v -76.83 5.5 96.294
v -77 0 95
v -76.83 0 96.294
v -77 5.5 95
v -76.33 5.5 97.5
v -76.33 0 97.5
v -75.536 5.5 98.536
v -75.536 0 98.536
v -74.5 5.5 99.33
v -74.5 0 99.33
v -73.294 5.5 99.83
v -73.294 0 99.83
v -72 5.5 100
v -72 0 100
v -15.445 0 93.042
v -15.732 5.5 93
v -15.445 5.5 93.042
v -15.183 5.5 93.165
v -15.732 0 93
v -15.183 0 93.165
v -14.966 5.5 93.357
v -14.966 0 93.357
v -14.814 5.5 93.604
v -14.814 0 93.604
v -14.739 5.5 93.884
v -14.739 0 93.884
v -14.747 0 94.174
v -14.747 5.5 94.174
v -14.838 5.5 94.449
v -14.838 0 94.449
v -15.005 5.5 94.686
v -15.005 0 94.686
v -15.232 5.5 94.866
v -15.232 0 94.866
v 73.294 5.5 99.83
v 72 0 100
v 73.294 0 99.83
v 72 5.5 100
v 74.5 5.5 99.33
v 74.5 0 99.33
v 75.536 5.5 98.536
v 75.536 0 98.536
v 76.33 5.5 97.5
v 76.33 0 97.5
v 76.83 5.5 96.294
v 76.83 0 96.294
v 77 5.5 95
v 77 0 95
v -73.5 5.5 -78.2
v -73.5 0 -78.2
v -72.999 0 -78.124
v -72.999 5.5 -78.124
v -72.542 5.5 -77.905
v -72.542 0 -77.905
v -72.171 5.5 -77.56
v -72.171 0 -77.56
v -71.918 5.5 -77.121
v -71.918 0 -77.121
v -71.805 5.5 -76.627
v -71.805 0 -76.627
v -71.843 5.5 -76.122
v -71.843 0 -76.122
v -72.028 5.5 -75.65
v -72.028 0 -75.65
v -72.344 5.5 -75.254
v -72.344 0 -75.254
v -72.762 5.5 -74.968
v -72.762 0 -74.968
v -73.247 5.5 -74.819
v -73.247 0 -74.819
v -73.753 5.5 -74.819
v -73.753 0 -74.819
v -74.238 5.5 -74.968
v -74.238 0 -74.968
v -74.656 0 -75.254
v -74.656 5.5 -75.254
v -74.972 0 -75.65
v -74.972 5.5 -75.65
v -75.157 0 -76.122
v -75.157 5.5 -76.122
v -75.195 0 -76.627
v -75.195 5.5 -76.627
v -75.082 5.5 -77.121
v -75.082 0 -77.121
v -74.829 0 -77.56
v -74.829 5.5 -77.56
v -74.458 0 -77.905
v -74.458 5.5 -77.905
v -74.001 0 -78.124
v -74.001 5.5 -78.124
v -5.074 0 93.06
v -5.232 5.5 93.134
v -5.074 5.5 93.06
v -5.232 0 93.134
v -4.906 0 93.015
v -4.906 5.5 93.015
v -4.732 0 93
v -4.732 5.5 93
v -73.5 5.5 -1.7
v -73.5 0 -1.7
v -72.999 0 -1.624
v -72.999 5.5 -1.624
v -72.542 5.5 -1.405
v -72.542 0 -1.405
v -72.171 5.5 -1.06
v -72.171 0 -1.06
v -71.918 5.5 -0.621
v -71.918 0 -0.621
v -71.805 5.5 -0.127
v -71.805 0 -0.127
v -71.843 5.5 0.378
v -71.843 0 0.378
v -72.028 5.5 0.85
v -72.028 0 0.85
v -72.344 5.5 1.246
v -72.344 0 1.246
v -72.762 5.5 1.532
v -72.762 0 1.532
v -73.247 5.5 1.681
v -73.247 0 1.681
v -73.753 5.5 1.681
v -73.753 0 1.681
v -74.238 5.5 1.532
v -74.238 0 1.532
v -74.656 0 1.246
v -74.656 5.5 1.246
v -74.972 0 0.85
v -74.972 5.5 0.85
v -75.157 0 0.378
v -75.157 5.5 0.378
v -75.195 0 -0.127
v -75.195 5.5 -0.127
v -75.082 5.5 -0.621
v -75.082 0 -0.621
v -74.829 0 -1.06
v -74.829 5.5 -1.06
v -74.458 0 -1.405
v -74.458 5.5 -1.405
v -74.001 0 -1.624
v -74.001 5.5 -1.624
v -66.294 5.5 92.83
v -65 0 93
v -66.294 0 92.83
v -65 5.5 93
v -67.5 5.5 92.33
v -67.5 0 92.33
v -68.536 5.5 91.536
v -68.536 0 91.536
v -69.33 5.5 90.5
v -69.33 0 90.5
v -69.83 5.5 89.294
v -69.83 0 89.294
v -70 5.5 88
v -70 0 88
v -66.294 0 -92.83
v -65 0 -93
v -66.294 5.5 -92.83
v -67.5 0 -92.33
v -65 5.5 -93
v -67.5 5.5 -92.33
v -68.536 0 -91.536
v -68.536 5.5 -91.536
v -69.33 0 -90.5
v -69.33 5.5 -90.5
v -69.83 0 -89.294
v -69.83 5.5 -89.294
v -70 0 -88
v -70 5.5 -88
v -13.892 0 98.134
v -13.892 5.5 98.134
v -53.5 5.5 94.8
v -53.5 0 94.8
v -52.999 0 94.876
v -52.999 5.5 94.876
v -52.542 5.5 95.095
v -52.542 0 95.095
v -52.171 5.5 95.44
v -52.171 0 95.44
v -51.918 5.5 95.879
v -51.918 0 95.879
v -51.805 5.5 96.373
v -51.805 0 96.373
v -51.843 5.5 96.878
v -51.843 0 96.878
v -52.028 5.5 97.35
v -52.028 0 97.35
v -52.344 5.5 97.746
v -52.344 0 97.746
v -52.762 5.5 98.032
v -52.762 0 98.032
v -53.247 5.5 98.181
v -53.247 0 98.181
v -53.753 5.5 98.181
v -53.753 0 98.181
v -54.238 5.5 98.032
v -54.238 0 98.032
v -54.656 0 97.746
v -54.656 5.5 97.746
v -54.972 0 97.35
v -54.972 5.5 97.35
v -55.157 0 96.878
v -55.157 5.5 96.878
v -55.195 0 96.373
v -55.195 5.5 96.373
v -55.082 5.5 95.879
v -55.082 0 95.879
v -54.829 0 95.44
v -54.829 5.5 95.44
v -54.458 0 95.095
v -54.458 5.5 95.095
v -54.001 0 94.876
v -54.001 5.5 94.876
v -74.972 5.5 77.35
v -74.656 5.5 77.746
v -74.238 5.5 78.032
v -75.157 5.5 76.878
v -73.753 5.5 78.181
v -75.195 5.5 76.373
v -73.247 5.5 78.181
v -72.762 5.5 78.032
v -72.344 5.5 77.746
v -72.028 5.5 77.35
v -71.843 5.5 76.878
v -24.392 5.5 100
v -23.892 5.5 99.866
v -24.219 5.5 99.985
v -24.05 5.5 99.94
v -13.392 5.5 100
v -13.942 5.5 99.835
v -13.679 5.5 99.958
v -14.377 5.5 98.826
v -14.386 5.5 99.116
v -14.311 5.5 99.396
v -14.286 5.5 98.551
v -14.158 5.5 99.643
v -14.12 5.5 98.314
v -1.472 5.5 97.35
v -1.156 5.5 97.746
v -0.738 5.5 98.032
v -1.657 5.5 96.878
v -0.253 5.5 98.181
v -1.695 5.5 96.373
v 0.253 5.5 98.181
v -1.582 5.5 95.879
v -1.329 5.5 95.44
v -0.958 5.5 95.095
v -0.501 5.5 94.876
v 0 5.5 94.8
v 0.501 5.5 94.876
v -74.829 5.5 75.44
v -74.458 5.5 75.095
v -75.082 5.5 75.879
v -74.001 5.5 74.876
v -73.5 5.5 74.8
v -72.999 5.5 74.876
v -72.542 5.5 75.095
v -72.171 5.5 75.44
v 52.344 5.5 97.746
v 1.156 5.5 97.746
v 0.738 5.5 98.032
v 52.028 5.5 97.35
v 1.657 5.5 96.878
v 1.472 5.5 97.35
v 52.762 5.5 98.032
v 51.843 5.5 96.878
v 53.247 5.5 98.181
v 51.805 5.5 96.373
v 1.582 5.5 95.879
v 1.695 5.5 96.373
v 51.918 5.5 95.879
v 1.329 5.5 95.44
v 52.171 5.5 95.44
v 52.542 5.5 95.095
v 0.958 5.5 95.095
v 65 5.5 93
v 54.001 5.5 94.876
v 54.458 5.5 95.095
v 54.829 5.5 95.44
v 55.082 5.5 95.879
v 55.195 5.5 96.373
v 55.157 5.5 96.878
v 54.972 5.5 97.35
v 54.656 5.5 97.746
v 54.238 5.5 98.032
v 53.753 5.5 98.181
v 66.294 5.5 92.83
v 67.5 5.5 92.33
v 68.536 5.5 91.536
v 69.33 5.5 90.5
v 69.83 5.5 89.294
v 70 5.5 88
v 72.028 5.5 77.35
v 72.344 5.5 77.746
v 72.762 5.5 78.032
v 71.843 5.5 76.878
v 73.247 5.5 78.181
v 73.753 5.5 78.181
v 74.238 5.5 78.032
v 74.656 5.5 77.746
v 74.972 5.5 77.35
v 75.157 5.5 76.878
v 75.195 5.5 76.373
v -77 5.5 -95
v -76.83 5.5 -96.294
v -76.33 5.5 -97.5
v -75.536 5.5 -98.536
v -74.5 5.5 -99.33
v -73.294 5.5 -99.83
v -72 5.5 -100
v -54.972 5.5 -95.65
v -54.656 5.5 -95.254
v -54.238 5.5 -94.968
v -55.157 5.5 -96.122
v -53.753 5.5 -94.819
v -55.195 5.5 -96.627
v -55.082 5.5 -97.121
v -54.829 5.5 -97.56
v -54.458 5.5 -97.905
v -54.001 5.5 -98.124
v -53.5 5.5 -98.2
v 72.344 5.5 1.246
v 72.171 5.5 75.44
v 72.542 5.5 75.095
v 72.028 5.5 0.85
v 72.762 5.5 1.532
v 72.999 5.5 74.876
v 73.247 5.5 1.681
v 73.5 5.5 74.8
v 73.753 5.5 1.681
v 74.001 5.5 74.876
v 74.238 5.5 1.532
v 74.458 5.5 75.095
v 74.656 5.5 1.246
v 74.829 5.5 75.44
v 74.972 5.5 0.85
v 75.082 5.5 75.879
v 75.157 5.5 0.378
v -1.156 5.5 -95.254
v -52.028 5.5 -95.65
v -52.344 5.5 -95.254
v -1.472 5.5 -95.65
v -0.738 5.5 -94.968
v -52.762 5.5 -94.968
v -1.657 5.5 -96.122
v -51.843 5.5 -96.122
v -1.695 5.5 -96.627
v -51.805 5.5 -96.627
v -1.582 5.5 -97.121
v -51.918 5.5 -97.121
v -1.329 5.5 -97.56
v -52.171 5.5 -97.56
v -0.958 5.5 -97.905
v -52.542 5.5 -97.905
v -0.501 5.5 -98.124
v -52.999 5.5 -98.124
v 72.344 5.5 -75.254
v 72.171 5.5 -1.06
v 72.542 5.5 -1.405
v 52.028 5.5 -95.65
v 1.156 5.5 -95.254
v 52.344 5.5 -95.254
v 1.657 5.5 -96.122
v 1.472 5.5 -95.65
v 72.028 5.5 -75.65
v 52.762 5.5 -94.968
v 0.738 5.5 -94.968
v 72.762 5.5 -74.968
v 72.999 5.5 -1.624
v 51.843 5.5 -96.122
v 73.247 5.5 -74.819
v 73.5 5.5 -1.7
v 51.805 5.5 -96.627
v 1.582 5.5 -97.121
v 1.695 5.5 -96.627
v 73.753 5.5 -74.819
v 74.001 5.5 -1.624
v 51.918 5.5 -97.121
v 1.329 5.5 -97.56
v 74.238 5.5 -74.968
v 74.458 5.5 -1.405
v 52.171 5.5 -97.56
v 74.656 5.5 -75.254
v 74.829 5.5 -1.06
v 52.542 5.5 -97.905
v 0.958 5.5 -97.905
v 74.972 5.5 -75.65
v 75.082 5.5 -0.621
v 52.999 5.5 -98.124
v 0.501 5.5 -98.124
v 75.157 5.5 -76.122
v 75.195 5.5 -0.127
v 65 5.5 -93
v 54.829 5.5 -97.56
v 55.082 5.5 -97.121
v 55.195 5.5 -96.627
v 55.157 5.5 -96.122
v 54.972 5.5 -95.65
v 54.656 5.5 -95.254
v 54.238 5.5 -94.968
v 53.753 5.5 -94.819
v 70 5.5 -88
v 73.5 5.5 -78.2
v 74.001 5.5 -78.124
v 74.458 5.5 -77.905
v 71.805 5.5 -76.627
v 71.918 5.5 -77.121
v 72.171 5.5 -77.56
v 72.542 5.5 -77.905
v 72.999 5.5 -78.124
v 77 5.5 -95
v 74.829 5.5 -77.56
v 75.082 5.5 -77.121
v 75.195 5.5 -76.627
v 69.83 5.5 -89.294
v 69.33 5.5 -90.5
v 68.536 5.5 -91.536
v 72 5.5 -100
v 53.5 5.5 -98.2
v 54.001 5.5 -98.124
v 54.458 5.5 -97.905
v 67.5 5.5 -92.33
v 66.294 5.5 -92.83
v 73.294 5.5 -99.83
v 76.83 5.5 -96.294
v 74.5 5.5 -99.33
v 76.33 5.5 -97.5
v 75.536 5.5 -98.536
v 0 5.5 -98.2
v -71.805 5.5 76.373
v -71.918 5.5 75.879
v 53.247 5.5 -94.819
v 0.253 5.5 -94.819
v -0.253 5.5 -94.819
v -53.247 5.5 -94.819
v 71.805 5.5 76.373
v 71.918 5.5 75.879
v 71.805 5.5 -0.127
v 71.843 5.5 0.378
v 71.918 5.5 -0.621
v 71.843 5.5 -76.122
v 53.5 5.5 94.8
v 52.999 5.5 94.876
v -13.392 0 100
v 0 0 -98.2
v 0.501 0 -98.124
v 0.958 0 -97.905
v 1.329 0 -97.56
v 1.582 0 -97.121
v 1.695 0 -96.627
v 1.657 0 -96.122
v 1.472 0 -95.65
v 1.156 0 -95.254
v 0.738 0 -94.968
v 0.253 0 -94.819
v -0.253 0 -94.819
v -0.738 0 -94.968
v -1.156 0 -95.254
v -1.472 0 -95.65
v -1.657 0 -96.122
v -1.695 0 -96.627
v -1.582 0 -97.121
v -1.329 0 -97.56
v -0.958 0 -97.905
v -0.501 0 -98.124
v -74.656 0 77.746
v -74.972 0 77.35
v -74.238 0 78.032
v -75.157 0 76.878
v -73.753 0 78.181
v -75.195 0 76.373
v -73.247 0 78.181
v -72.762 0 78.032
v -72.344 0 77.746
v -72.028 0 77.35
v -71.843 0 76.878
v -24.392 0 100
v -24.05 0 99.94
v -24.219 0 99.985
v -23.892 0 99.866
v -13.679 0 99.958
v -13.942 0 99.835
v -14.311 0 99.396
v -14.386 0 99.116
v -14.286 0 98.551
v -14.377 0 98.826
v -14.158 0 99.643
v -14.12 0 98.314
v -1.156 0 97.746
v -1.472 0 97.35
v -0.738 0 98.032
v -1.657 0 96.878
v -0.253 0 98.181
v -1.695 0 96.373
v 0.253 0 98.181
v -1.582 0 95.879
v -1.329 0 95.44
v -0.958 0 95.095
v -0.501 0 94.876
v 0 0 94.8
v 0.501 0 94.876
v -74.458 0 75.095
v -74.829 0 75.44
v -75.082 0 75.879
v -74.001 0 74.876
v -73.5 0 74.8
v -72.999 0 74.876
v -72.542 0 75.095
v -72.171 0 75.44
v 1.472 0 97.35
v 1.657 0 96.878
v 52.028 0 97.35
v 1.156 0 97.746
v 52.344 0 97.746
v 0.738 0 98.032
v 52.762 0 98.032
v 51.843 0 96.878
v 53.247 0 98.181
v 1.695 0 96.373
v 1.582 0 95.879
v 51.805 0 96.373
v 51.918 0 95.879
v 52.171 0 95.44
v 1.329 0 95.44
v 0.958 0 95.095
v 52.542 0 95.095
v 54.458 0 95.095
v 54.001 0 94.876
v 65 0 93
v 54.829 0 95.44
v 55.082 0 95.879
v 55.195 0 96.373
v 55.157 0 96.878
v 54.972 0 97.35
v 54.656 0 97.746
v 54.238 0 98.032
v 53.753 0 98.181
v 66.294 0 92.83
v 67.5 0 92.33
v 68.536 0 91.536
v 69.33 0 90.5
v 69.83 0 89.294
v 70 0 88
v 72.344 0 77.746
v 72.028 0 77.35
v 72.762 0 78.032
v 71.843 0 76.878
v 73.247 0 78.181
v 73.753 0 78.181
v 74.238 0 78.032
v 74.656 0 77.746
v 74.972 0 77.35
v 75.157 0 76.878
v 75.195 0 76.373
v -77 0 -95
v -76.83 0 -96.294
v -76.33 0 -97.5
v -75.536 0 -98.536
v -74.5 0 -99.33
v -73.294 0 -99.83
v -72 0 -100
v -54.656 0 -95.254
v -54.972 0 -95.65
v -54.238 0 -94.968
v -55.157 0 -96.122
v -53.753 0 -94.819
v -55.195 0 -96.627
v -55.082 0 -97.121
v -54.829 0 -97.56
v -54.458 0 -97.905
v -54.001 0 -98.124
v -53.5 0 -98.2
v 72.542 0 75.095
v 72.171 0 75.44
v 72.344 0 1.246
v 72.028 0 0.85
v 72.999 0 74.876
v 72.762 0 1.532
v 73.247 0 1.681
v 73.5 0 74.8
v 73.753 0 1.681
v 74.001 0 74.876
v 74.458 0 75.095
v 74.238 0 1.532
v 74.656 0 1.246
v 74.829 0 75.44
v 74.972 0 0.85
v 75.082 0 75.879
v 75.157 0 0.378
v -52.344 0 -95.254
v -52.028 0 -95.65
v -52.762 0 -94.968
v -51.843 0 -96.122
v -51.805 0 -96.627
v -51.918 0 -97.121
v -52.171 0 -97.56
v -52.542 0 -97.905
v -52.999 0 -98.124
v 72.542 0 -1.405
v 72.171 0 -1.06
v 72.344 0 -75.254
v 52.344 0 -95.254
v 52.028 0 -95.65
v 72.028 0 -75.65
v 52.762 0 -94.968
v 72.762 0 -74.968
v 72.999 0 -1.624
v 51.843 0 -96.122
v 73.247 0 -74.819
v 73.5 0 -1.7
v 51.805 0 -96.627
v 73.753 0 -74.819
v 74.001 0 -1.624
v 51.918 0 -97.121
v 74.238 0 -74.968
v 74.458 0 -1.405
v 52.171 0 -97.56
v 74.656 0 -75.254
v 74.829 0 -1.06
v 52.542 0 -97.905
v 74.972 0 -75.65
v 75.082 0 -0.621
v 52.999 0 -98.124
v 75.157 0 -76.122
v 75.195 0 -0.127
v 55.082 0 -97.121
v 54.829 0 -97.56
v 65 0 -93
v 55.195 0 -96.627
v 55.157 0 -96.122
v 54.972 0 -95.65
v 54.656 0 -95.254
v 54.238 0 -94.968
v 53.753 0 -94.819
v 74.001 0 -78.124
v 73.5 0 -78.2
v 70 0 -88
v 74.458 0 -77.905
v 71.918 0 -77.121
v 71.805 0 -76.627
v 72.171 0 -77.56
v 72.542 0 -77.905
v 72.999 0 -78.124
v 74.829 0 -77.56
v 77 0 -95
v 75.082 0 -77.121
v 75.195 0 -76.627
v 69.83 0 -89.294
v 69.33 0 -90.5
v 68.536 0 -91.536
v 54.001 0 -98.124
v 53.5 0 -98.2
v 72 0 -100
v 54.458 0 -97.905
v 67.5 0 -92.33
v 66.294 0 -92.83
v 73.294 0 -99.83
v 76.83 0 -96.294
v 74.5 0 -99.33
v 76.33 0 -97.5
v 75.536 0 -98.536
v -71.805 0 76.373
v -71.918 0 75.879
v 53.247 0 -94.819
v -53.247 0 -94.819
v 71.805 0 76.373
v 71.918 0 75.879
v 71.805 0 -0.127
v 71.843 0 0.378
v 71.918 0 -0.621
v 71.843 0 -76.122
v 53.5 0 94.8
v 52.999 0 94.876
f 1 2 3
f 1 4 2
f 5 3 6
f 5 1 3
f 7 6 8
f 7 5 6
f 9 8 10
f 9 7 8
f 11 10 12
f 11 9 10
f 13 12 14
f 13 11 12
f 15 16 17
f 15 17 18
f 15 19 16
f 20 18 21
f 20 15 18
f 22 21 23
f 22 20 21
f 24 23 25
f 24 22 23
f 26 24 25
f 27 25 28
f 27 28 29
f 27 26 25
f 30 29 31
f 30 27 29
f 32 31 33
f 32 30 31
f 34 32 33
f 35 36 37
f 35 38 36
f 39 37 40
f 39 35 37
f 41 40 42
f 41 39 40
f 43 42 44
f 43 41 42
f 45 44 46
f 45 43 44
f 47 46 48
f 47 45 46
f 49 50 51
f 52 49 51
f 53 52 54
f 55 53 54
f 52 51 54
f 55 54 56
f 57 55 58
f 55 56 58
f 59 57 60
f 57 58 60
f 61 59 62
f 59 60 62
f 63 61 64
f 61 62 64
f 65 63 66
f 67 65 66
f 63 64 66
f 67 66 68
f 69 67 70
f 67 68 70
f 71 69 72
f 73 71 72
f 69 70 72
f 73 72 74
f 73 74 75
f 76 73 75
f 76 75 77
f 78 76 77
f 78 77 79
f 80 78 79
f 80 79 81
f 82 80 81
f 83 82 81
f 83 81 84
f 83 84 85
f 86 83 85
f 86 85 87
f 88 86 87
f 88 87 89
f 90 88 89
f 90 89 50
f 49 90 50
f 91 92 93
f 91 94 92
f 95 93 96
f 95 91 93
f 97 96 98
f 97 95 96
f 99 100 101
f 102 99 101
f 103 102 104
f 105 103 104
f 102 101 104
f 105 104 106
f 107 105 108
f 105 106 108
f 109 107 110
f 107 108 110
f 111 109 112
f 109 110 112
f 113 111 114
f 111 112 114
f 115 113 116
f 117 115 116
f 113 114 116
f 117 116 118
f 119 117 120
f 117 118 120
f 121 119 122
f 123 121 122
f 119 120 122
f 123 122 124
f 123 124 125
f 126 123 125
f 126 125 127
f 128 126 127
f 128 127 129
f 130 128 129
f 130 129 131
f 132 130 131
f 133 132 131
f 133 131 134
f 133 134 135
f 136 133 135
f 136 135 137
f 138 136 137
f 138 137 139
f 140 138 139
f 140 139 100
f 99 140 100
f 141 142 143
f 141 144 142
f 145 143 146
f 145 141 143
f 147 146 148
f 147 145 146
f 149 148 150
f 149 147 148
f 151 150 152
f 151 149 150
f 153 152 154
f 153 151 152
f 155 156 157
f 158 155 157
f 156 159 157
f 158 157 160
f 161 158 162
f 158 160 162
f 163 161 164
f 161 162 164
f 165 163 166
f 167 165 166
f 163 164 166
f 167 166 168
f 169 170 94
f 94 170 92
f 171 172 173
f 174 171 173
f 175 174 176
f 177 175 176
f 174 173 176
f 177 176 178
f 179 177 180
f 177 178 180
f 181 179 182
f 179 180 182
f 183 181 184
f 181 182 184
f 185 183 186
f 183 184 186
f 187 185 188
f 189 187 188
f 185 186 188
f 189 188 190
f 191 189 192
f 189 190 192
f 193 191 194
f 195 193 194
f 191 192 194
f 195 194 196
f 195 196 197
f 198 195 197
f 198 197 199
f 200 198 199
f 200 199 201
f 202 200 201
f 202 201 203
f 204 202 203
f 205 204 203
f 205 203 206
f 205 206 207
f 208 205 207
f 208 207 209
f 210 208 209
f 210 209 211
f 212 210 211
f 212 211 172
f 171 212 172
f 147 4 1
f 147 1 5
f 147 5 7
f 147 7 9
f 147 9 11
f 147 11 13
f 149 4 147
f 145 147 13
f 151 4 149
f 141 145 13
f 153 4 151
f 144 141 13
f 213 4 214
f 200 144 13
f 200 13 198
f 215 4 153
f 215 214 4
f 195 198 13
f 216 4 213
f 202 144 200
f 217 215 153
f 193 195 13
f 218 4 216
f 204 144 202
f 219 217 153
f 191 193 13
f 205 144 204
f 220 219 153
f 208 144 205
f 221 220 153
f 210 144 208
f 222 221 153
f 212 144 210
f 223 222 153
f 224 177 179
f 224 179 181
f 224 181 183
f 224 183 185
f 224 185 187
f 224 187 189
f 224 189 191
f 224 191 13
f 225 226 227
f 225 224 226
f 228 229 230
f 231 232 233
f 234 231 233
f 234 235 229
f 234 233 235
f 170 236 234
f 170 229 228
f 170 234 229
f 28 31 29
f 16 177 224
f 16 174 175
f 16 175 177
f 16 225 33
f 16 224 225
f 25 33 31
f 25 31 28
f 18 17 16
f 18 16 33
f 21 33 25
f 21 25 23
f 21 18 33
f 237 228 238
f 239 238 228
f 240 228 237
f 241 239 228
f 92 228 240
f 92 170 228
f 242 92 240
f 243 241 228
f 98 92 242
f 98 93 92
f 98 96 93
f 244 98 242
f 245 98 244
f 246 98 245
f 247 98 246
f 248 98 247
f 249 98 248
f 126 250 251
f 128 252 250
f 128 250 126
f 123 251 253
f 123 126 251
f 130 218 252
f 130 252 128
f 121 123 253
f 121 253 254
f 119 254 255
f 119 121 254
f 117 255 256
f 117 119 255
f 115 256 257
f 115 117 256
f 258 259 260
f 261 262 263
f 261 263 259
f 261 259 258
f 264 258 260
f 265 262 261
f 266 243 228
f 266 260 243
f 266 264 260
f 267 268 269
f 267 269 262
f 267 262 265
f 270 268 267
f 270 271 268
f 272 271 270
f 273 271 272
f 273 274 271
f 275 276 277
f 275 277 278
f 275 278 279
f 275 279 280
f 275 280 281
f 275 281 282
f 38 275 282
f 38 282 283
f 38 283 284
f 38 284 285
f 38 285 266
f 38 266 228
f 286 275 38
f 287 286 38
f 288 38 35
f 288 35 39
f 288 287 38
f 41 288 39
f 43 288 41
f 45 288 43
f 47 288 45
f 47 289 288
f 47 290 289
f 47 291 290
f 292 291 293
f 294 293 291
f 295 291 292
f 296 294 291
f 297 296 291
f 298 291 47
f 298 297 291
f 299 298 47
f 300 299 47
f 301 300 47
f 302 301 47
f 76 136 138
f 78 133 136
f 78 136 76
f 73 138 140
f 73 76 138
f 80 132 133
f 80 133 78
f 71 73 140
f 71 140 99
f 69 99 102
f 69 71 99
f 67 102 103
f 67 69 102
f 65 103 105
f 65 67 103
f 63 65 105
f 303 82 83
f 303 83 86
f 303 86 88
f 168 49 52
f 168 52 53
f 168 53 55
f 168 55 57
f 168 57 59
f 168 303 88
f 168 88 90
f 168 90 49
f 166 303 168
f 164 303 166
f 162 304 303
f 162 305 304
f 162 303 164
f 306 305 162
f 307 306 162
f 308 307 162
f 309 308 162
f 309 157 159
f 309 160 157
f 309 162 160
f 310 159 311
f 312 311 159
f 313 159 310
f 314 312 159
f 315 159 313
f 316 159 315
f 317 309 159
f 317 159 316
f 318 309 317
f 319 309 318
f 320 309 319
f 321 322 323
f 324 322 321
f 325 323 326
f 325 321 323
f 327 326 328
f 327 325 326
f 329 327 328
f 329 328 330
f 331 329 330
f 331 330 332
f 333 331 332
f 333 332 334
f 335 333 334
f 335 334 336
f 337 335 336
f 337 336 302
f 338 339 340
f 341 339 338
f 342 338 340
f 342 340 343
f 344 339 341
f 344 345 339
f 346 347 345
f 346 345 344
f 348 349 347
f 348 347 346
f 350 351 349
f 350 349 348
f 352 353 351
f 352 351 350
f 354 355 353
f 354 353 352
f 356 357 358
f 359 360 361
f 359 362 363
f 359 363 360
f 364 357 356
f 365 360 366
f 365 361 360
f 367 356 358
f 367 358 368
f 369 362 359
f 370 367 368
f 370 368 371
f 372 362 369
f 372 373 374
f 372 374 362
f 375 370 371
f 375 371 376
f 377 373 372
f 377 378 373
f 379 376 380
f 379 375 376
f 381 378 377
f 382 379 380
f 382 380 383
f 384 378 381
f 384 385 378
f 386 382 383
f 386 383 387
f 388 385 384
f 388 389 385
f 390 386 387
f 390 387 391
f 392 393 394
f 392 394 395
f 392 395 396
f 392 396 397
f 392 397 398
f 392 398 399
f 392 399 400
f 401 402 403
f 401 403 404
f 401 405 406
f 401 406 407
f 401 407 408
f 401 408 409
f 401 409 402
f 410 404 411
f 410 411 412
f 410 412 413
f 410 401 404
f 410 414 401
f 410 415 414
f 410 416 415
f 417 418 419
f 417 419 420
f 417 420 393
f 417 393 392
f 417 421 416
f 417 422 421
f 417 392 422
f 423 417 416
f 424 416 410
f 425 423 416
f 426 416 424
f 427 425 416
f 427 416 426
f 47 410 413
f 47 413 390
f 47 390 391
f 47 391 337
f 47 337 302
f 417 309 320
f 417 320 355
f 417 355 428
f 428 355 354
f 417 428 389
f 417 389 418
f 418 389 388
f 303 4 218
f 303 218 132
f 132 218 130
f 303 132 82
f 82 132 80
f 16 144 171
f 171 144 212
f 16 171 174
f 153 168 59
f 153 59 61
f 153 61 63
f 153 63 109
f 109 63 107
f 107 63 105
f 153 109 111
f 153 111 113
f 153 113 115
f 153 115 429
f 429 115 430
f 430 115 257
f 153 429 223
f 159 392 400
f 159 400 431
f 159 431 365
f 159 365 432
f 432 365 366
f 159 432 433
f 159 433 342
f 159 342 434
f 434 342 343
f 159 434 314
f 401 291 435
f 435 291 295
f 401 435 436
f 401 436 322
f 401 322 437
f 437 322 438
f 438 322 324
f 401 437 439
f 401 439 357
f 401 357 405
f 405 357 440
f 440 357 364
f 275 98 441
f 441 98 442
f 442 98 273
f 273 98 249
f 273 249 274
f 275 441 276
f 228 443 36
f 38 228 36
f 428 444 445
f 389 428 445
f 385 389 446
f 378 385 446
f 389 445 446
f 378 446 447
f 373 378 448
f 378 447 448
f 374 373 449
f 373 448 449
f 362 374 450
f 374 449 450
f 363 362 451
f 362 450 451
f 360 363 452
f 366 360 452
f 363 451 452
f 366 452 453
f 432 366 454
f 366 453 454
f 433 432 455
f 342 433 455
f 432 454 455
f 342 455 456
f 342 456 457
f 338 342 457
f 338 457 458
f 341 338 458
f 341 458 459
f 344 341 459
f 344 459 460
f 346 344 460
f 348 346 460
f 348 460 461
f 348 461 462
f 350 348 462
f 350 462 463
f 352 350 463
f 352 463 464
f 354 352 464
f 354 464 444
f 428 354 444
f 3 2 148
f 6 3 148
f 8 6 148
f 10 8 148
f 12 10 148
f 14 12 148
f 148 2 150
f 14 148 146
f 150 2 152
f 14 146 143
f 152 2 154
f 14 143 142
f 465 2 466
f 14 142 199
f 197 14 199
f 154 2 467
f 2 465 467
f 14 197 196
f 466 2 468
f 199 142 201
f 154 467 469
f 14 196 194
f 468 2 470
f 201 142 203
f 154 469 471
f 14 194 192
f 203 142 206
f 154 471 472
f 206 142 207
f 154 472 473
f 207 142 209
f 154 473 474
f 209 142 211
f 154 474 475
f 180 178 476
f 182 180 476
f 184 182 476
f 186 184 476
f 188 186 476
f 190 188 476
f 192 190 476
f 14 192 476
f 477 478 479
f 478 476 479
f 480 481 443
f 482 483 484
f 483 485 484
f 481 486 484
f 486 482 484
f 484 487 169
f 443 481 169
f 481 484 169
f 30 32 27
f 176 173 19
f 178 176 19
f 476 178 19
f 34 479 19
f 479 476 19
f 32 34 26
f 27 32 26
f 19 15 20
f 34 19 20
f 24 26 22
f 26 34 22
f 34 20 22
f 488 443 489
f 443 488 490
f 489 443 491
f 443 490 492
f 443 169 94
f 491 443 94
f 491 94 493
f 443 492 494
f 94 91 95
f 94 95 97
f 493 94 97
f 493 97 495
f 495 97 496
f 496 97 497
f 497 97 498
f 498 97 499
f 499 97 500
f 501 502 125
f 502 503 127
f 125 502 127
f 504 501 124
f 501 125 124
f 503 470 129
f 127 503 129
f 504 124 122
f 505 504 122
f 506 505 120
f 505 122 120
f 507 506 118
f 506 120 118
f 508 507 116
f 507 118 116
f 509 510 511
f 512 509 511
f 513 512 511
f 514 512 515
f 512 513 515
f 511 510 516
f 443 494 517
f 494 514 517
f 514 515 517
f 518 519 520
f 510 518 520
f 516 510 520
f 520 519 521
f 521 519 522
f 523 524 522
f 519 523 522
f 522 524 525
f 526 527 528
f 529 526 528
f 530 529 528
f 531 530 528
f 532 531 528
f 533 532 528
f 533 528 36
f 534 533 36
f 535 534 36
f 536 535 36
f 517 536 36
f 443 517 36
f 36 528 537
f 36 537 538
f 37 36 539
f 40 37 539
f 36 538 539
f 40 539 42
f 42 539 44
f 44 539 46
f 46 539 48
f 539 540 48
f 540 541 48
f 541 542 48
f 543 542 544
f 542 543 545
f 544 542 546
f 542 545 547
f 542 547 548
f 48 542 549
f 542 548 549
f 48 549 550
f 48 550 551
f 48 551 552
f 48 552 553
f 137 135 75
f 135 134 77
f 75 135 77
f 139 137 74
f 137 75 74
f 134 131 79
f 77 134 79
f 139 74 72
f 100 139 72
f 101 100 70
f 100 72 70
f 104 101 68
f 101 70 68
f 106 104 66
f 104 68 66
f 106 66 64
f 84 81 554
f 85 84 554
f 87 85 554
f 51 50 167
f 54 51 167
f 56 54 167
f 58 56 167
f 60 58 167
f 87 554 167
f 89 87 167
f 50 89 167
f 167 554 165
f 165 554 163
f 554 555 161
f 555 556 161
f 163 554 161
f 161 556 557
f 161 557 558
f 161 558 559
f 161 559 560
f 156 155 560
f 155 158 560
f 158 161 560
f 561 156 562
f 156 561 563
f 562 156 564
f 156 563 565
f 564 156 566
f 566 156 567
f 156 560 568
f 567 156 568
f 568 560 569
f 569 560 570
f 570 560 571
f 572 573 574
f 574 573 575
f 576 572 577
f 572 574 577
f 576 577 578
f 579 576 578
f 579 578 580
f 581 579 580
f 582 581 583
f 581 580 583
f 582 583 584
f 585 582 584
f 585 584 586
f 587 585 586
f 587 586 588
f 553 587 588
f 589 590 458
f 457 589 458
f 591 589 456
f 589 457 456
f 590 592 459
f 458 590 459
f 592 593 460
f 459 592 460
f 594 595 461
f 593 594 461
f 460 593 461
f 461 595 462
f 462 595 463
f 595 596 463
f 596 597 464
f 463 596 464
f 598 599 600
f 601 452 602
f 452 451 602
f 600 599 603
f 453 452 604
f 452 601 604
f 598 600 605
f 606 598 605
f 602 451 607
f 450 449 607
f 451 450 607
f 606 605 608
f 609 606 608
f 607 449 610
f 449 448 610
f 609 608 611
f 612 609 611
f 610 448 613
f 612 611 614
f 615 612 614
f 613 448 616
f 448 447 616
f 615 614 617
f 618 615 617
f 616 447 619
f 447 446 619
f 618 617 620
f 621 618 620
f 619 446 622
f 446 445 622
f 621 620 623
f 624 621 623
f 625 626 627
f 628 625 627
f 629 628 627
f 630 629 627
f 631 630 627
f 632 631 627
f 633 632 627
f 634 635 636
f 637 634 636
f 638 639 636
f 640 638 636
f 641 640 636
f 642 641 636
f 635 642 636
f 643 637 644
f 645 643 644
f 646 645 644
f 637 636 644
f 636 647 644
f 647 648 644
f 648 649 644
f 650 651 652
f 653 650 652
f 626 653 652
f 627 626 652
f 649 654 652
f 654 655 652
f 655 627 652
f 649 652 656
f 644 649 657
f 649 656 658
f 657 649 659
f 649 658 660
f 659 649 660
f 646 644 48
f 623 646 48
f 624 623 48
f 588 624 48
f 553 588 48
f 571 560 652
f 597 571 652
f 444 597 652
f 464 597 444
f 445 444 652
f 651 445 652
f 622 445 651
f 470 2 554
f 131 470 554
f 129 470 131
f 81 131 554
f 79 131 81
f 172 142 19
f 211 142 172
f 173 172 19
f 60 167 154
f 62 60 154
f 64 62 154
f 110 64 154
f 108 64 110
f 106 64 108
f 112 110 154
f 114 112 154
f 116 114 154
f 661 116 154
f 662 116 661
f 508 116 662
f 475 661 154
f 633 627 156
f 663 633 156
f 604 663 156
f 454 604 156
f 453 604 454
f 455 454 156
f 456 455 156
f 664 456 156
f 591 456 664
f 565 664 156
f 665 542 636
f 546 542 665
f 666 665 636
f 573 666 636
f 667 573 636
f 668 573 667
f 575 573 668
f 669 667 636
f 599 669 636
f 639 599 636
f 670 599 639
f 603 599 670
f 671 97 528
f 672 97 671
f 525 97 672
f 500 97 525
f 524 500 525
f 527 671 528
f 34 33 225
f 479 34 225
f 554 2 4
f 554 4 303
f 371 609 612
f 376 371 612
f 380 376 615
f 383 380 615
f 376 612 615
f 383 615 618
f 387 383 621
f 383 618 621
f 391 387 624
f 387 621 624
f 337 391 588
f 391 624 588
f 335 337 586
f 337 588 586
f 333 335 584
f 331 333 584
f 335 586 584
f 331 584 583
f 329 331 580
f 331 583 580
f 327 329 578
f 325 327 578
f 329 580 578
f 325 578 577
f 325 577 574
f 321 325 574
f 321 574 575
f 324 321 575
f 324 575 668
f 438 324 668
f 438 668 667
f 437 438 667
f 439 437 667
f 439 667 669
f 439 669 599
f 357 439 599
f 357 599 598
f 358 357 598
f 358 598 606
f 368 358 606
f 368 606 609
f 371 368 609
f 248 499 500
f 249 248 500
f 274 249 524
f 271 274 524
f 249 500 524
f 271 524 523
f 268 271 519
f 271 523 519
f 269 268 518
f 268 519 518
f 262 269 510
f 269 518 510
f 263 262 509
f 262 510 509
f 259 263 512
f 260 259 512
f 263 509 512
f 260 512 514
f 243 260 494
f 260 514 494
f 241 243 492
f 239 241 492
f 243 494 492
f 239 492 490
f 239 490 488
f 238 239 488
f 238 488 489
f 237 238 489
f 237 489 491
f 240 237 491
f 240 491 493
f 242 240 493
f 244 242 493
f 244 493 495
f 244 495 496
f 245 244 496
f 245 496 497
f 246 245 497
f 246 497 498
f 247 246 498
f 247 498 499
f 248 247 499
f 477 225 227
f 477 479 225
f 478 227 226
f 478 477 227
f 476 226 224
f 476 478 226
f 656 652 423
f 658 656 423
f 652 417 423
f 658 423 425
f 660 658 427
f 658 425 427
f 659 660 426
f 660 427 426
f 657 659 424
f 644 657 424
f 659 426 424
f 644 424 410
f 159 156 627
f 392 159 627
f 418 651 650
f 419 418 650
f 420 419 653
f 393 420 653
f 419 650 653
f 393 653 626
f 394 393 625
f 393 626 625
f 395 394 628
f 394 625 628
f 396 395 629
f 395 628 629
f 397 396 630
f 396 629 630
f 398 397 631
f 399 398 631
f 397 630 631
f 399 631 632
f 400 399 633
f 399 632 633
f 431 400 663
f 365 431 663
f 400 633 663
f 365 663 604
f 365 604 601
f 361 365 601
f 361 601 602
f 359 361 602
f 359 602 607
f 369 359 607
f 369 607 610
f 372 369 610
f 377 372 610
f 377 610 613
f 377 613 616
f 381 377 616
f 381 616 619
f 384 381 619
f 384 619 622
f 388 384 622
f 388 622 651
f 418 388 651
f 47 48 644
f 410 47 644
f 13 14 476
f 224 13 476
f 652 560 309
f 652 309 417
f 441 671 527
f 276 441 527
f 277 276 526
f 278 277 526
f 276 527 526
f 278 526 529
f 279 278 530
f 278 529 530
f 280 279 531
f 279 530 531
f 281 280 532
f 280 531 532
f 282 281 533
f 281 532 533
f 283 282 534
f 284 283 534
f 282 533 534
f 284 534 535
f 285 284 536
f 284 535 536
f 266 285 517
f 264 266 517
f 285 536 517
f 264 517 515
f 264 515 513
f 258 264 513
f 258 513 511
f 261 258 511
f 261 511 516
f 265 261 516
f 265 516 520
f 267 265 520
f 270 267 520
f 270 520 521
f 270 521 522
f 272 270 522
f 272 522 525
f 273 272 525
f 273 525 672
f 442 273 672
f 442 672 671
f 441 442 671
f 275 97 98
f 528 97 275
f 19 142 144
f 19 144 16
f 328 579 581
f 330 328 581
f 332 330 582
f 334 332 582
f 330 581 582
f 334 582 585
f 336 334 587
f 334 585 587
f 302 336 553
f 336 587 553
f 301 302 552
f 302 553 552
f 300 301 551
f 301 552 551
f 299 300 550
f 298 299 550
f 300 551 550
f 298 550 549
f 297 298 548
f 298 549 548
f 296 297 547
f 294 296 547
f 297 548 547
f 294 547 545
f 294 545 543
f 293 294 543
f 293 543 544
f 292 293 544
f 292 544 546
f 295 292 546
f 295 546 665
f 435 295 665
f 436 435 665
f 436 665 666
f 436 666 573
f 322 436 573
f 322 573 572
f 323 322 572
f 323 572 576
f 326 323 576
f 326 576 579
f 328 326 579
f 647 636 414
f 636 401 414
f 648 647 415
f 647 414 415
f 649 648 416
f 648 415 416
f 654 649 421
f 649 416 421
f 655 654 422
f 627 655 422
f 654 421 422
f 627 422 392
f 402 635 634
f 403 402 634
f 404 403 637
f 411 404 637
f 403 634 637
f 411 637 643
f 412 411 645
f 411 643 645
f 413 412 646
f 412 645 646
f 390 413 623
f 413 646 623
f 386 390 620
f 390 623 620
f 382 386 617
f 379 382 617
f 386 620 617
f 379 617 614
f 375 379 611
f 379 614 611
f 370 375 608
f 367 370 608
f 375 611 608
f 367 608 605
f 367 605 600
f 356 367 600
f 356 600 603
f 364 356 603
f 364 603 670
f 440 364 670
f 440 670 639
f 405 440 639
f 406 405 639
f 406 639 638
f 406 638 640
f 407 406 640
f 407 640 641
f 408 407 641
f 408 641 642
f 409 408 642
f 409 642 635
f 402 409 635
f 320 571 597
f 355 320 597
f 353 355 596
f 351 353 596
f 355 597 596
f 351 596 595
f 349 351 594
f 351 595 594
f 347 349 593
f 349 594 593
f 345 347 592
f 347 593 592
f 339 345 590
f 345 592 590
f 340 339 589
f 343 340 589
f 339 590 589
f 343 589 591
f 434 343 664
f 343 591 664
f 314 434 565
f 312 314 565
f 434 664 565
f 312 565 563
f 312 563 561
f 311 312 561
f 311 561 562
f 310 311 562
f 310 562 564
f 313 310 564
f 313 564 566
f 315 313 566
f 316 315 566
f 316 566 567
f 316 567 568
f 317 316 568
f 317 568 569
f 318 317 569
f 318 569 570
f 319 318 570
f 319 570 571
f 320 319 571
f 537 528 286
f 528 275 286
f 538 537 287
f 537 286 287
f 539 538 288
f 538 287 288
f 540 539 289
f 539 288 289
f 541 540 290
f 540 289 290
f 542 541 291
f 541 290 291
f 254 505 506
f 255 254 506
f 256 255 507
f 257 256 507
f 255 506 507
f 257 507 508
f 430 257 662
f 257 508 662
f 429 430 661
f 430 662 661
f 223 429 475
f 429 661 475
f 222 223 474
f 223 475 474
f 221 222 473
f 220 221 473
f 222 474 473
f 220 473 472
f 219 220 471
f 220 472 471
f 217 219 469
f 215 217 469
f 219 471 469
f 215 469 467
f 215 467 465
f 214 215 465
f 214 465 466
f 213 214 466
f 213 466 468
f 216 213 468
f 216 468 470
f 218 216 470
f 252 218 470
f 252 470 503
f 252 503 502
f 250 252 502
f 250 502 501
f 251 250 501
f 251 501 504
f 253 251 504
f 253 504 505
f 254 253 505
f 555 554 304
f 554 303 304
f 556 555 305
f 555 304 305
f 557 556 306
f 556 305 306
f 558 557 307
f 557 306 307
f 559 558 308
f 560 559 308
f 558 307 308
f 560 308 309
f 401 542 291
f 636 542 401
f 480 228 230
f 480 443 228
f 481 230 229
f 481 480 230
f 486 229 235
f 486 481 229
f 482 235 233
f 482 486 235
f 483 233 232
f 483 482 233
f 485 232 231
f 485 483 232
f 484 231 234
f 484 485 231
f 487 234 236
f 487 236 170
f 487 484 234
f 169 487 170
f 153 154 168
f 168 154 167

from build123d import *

# Parameters (mm, degrees)
SKETCH1_W           = 154
SKETCH1_H           = 200
SKETCH1_W_2         = 140
SKETCH1_H_2         = 186
BOSS_EXTRUDE1_DEPTH = 5.5
FILLET1_R           = 5
SKETCH3_R           = 1.7
CUT_EXTRUDE1_DEPTH  = 127.329925196
CUT_EXTRUDE2_DEPTH  = 127.329925196
FILLET2_R           = 1


with BuildPart() as part:
    # Sketch1 → Boss-Extrude1 (new body)
    with BuildSketch(Plane(origin=(0, 0, 0), x_dir=(1, 0, 0), z_dir=(0, 1, 0))):
        Rectangle(SKETCH1_W, SKETCH1_H)
        Rectangle(SKETCH1_W_2, SKETCH1_H_2, mode=Mode.SUBTRACT)
    extrude(amount=BOSS_EXTRUDE1_DEPTH)

    # Fillet1
    fillet1_edges = [part.edges().sort_by_distance(p)[0] for p in [
        (70, 2.75, 93),
        (70, 2.75, -93),
        (-70, 2.75, -93),
        (-70, 2.75, 93),
        (-77, 2.75, -100),
        (77, 2.75, -100),
        (77, 2.75, 100),
        (-77, 2.75, 100),
    ]]
    fillet(fillet1_edges, radius=FILLET1_R)

    # Sketch3 → Cut-Extrude1 (cut, through all)
    with BuildSketch(Plane.XZ):
        with Locations(Location((73.5, -76.5, 0), (0, 0, 270))):
            Circle(SKETCH3_R)
        with Locations(Location((53.5, -96.5, 0), (0, 0, 270))):
            Circle(SKETCH3_R)
        with Locations(Location((-53.5, -96.5, 0), (0, 0, 270))):
            Circle(SKETCH3_R)
        with Locations(Location((-73.5, -76.5, 0), (0, 0, 270))):
            Circle(SKETCH3_R)
        with Locations(Location((-73.5, 0, 0), (0, 0, 270))):
            Circle(SKETCH3_R)
        with Locations(Location((-73.5, 76.5, 0), (0, 0, 270))):
            Circle(SKETCH3_R)
        with Locations(Location((-53.5, 96.5, 0), (0, 0, 270))):
            Circle(SKETCH3_R)
        with Locations(Location((53.5, 96.5, 0), (0, 0, 270))):
            Circle(SKETCH3_R)
        with Locations(Location((73.5, 76.5, 0), (0, 0, 270))):
            Circle(SKETCH3_R)
        with Locations(Location((73.5, 0, 0), (0, 0, 270))):
            Circle(SKETCH3_R)
        with Locations(Location((0, -96.5, 0), (0, 0, 270))):
            Circle(SKETCH3_R)
        with Locations(Location((0, 96.5, 0), (0, 0, 270))):
            Circle(SKETCH3_R)
    extrude(amount=-CUT_EXTRUDE1_DEPTH, mode=Mode.SUBTRACT)

    # Sketch4 → Cut-Extrude2 (cut, through all)
    with BuildSketch(Plane(origin=(0, 5.5, 0), x_dir=(1, 0, 0), z_dir=(0, 1, 0))):
        Polygon((-17.124355653, -100), (-5, -93), (-12, -93), (-24.124355653, -100), align=None)
    extrude(amount=-CUT_EXTRUDE2_DEPTH, mode=Mode.SUBTRACT)

    # Fillet2
    fillet2_edges = [part.edges().sort_by_distance(p)[0] for p in [
        (-17.124355653, 2.75, 100),
        (-24.124355653, 2.75, 100),
        (-12, 2.75, 93),
        (-5, 2.75, 93),
    ]]
    fillet(fillet2_edges, radius=FILLET2_R)


solid = part.part
